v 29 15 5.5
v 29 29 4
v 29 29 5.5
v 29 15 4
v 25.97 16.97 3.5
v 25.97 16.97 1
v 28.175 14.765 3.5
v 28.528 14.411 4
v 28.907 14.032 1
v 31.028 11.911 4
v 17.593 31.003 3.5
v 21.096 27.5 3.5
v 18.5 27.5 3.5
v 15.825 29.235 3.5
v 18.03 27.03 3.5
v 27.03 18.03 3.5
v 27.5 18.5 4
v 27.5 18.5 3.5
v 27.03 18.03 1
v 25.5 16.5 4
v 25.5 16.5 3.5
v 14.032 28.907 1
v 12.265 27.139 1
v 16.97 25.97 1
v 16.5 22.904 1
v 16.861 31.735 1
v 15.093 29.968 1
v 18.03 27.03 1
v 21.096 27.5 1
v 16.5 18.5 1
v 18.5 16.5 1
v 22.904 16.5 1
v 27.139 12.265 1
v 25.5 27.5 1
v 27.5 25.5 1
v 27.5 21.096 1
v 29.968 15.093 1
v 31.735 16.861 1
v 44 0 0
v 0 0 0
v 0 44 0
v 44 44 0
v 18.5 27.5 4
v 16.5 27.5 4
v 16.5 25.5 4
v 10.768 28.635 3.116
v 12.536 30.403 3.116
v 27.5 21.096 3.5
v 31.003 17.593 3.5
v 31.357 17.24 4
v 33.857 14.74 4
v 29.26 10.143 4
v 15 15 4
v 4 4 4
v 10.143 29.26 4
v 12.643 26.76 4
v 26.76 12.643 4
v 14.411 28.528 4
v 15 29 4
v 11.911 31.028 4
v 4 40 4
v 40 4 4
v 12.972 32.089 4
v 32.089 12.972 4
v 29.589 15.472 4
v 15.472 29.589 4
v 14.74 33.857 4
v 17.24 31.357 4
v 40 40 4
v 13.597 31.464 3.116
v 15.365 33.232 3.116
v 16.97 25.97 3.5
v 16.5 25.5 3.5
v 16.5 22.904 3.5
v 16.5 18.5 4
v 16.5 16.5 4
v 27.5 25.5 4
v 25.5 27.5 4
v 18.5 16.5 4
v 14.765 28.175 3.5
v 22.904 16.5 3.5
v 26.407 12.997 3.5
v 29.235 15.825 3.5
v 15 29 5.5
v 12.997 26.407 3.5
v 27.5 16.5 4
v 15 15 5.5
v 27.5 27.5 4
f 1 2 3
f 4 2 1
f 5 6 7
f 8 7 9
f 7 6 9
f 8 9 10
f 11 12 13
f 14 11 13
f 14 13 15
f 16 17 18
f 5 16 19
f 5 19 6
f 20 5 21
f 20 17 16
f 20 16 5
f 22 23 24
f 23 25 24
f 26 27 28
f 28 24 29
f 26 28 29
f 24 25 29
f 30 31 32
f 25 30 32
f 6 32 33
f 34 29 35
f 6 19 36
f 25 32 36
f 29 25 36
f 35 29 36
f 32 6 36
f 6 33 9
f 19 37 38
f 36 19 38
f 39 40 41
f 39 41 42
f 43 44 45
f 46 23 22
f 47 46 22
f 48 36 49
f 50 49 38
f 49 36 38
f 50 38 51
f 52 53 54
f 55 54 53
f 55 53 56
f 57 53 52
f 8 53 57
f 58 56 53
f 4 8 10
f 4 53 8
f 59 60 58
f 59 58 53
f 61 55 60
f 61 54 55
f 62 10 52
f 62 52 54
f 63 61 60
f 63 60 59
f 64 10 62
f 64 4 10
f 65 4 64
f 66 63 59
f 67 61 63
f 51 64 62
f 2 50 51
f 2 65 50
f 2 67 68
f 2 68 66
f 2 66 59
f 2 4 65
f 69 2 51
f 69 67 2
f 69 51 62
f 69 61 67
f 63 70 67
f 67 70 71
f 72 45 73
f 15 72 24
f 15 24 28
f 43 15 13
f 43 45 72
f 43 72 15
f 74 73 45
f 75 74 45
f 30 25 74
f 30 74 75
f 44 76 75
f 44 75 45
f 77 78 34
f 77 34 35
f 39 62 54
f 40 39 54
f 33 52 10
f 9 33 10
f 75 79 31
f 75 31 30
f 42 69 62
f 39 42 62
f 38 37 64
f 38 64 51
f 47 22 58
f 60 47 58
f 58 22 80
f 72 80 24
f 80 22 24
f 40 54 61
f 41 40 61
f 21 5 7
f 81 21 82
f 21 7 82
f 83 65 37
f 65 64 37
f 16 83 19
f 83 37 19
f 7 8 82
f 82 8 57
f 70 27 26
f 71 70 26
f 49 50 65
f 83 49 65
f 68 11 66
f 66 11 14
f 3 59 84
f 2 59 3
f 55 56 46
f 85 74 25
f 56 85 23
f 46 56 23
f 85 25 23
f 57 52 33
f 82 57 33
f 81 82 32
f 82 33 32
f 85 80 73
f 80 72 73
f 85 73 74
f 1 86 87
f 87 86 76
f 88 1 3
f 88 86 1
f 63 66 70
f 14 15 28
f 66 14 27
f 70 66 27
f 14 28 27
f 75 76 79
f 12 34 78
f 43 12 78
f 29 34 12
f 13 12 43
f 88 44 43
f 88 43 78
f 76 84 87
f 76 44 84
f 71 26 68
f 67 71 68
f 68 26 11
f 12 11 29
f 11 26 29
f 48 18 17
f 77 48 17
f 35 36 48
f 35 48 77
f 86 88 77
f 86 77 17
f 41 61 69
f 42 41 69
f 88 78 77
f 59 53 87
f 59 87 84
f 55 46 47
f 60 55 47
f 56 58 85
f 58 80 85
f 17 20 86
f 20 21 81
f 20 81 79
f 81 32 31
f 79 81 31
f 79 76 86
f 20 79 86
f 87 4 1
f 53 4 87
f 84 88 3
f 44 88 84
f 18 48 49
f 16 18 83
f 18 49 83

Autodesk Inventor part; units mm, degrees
ref_plane "YZ Plane" through (0, 0, 0) normal (1, 0, 0) x (0, 1, 0)
sketch "Sketch1" plane through (0, 0, 0) normal (0, 0, 1) x (1, 0, 0)
  line L0 (0, 0) -> (44, 0)
  line L1 (44, 0) -> (44, 44)
  line L2 (44, 44) -> (0, 44)
  line L3 (0, 44) -> (0, 0)
  dimension "d0" = 44
  dimension "d1" = 44
extrude "Extrusion1" add sketch "Sketch1" along normal blind 4
chamfer "Chamfer1" distance 4 angle 45 4 edges at (22, 44, 4) (44, 22, 4) (22, 0, 4) (0, 22, 4)
sketch "Sketch2" plane through (0, 0, 4) normal (0, 0, 1) x (1, 0, 0)
  line L0 (40, 4) -> (4, 4) projected
  line L1 (40, 40) -> (40, 4) projected
  line L2 (4, 40) -> (40, 40) projected
  line L3 (4, 4) -> (4, 40) projected
  line L4 (40, 4) -> (4, 4) projected
  line L5 (40, 40) -> (40, 4) projected
  line L6 (4, 4) -> (40, 40)
  line L7 (4, 40) -> (40, 40) projected
  line L8 (40, 4) -> (4, 40)
  line L9 (22, 16.5) -> (16.5, 16.5)
  line L10 (16.5, 16.5) -> (16.5, 27.5)
  line L11 (16.5, 27.5) -> (27.5, 27.5)
  line L12 (27.5, 27.5) -> (27.5, 16.5)
  line L13 (27.5, 16.5) -> (22, 16.5)
  line L14 (27.5, 27.5) -> (27.5, 25.5)
  arc A0 (18.5, 27.5) -> (16.5, 25.5) centre (18.5, 25.5) ccw
  line L15 (18.5, 25.5) -> (18.5, 18.5)
  line L16 (18.5, 18.5) -> (25.5, 18.5)
  line L17 (25.5, 18.5) -> (25.5, 25.5)
  arc A1 (16.5, 18.5) -> (18.5, 16.5) centre (18.5, 18.5) ccw
  arc A2 (25.5, 16.5) -> (27.5, 18.5) centre (25.5, 18.5) ccw
  arc A3 (27.5, 25.5) -> (25.5, 27.5) centre (25.5, 25.5) ccw
  line L18 (27.5, 18.5) -> (25.5, 16.5)
  line L19 (18.5, 16.5) -> (16.5, 18.5)
  line L20 (16.5, 25.5) -> (18.5, 27.5)
  line L21 (25.5, 27.5) -> (27.5, 25.5)
  point P0 (0, 0)
  dimension "d86" = 2
extrude "Extrusion2" cut sketch "Sketch2" against normal blind 3 contours L18 L8 L17 L6 L21 L12 | L13 L9 L19 L6 L16 L8 L18 | L10 L20 L8 L15 L6 L19 | L21 L6 L8 L20 L11 | L16 L6 L8 | L8 L6 L17 | L15 L8 L6
ref_plane "Work Plane3" through (27.5, 16.5, 4) normal (-0.7071, -0.7071, 0) x (0, 0, 1)
ref_plane "Work Plane4" through (27.5, 27.5, 4) normal (0.7071, -0.7071, 0) x (0, 0, 1)
ref_plane "Work Plane5" through (26.0858, 15.0858, 4) normal (-0.7071, -0.7071, 0) x (0, 0, 1)
sketch "Sketch13" plane through (27.5, 27.5, 4) normal (0.7071, -0.7071, 0) x (0, 0, 1)
  line L0 (-4.8, 9.7782) -> (0.8, 9.7782) projected
  line L1 (-3, 9.1924) -> (-3, 14.1421) projected
  line L2 (-3, 9.7782) -> (-3, 11.0282)
  line L3 (-3, 11.0282) -> (-0.5, 11.0282)
  line L4 (-0.5, 11.0282) -> (-0.5, 8.5282)
  line L5 (-0.5, 8.5282) -> (-3, 8.5282)
  line L6 (-3, 8.5282) -> (-3, 9.7782)
  point P0 (-4, 38.8909)
  point P1 (-3, 9.1924)
  dimension "d88" = 1.25
  dimension "d89" = 2.5
  dimension "d90" = 2.5
sketch "Sketch14" plane through (26.0858, 15.0858, 4) normal (-0.7071, -0.7071, 0) x (0, 0, 1)
  line L0 (-3, 7.7782) -> (-1.75, 7.7782)
  line L1 (-1.75, 7.7782) -> (-1.75, 17.7782)
  line L2 (-1.75, 17.7782) -> (0, 19.5282)
  line L3 (-1.75, 17.7782) -> (0.7249, 17.7782) construction
  line L4 (-1.75, 7.7782) -> (-1.75, -2.2218)
  line L5 (-1.75, -2.2218) -> (0, -3.9718)
  line L6 (0, 19.5282) -> (2.0141, 21.5422)
  line L7 (0, -3.9718) -> (2.0141, -5.9859)
  point P0 (-4, 7.7782)
  dimension "d91" = 1.25
  dimension "d92" = 10
  dimension "d93" = 45
  dimension "d94" = 10
sweep "Sweep3" cut profiles "Sketch13" path "Sketch14" path curves L7 L5 L4 L1 L2 L6
mirror "Mirror2" about plane through (27.5, 16.5, 4) normal (-0.7071, -0.7071, 0) of "Sweep3"
sketch "Sketch15" plane through (0, 0, 4) normal (0, 0, 1) x (1, 0, 0)
  line L0 (17.2396, 31.3566) -> (15.4718, 29.5888) projected
  line L1 (15.4718, 29.5888) -> (12.9718, 32.0888) projected
  line L2 (12.9718, 32.0888) -> (14.7396, 33.8566) projected
  line L3 (14.7396, 33.8566) -> (17.2396, 31.3566) projected
  line L4 (31.3566, 17.2396) -> (33.8566, 14.7396) projected
  line L5 (33.8566, 14.7396) -> (32.0888, 12.9718) projected
  line L6 (32.0888, 12.9718) -> (29.5888, 15.4718) projected
  line L7 (29.5888, 15.4718) -> (31.3566, 17.2396) projected
  line L8 (14.4112, 28.5282) -> (12.6434, 26.7604) projected
  line L9 (12.6434, 26.7604) -> (10.1434, 29.2604) projected
  line L10 (10.1434, 29.2604) -> (11.9112, 31.0282) projected
  line L11 (11.9112, 31.0282) -> (14.4112, 28.5282) projected
  line L12 (29.2604, 10.1434) -> (26.7604, 12.6434) projected
  line L13 (26.7604, 12.6434) -> (28.5282, 14.4112) projected
  line L14 (28.5282, 14.4112) -> (31.0282, 11.9112) projected
  line L15 (31.0282, 11.9112) -> (29.2604, 10.1434) projected
  line L16 (18.5, 16.5) -> (16.5, 18.5) projected
  line L17 (16.5, 18.5) -> (16.5, 25.5) projected
  line L18 (16.5, 25.5) -> (18.5, 27.5) projected
  line L19 (18.5, 27.5) -> (25.5, 27.5) projected
  line L20 (25.5, 27.5) -> (27.5, 25.5) projected
  line L21 (27.5, 25.5) -> (27.5, 18.5) projected
  line L22 (27.5, 18.5) -> (25.5, 16.5) projected
  line L23 (25.5, 16.5) -> (18.5, 16.5) projected
  line L24 (40, 4) -> (4, 4) projected
  line L25 (40, 40) -> (40, 4) projected
  line L26 (4, 40) -> (40, 40) projected
  line L27 (4, 4) -> (4, 40) projected
  line L28 (16.5, 18.5) -> (16.5, 22.9038) projected
  line L29 (15, 22.9038) -> (15, 29)
  line L30 (15, 29) -> (29, 29)
  line L31 (29, 29) -> (29, 15)
  line L32 (29, 15) -> (15, 15)
  line L33 (15, 15) -> (15, 29)
  line L34 (16.5, 18.5) -> (16.5, 16.5)
  line L35 (16.5, 16.5) -> (18.5, 16.5)
  line L36 (25.5, 16.5) -> (22.9038, 16.5) projected
  line L37 (25.5, 16.5) -> (27.5, 16.5)
  line L38 (27.5, 16.5) -> (27.5, 18.5)
  line L39 (27.5, 25.5) -> (27.5, 27.5)
  line L40 (25.5, 27.5) -> (27.5, 25.5) projected
  line L41 (27.5, 27.5) -> (25.5, 27.5)
  line L42 (18.5, 27.5) -> (16.5, 27.5)
  line L43 (16.5, 27.5) -> (16.5, 25.5)
  point P0 (0, 0)
  dimension "d97" = 1.5
extrude "Extrusion7" add sketch "Sketch15" along normal blind 1.5 contours L29 L30 L31 L32 L33
chamfer "Chamfer6" distance 1.5 angle 45 4 edges at (22, 16.5, 5.5) (16.5, 22, 5.5) (27.5, 22, 5.5) (22, 27.5, 5.5)
properties part number "clear-square-reed"
